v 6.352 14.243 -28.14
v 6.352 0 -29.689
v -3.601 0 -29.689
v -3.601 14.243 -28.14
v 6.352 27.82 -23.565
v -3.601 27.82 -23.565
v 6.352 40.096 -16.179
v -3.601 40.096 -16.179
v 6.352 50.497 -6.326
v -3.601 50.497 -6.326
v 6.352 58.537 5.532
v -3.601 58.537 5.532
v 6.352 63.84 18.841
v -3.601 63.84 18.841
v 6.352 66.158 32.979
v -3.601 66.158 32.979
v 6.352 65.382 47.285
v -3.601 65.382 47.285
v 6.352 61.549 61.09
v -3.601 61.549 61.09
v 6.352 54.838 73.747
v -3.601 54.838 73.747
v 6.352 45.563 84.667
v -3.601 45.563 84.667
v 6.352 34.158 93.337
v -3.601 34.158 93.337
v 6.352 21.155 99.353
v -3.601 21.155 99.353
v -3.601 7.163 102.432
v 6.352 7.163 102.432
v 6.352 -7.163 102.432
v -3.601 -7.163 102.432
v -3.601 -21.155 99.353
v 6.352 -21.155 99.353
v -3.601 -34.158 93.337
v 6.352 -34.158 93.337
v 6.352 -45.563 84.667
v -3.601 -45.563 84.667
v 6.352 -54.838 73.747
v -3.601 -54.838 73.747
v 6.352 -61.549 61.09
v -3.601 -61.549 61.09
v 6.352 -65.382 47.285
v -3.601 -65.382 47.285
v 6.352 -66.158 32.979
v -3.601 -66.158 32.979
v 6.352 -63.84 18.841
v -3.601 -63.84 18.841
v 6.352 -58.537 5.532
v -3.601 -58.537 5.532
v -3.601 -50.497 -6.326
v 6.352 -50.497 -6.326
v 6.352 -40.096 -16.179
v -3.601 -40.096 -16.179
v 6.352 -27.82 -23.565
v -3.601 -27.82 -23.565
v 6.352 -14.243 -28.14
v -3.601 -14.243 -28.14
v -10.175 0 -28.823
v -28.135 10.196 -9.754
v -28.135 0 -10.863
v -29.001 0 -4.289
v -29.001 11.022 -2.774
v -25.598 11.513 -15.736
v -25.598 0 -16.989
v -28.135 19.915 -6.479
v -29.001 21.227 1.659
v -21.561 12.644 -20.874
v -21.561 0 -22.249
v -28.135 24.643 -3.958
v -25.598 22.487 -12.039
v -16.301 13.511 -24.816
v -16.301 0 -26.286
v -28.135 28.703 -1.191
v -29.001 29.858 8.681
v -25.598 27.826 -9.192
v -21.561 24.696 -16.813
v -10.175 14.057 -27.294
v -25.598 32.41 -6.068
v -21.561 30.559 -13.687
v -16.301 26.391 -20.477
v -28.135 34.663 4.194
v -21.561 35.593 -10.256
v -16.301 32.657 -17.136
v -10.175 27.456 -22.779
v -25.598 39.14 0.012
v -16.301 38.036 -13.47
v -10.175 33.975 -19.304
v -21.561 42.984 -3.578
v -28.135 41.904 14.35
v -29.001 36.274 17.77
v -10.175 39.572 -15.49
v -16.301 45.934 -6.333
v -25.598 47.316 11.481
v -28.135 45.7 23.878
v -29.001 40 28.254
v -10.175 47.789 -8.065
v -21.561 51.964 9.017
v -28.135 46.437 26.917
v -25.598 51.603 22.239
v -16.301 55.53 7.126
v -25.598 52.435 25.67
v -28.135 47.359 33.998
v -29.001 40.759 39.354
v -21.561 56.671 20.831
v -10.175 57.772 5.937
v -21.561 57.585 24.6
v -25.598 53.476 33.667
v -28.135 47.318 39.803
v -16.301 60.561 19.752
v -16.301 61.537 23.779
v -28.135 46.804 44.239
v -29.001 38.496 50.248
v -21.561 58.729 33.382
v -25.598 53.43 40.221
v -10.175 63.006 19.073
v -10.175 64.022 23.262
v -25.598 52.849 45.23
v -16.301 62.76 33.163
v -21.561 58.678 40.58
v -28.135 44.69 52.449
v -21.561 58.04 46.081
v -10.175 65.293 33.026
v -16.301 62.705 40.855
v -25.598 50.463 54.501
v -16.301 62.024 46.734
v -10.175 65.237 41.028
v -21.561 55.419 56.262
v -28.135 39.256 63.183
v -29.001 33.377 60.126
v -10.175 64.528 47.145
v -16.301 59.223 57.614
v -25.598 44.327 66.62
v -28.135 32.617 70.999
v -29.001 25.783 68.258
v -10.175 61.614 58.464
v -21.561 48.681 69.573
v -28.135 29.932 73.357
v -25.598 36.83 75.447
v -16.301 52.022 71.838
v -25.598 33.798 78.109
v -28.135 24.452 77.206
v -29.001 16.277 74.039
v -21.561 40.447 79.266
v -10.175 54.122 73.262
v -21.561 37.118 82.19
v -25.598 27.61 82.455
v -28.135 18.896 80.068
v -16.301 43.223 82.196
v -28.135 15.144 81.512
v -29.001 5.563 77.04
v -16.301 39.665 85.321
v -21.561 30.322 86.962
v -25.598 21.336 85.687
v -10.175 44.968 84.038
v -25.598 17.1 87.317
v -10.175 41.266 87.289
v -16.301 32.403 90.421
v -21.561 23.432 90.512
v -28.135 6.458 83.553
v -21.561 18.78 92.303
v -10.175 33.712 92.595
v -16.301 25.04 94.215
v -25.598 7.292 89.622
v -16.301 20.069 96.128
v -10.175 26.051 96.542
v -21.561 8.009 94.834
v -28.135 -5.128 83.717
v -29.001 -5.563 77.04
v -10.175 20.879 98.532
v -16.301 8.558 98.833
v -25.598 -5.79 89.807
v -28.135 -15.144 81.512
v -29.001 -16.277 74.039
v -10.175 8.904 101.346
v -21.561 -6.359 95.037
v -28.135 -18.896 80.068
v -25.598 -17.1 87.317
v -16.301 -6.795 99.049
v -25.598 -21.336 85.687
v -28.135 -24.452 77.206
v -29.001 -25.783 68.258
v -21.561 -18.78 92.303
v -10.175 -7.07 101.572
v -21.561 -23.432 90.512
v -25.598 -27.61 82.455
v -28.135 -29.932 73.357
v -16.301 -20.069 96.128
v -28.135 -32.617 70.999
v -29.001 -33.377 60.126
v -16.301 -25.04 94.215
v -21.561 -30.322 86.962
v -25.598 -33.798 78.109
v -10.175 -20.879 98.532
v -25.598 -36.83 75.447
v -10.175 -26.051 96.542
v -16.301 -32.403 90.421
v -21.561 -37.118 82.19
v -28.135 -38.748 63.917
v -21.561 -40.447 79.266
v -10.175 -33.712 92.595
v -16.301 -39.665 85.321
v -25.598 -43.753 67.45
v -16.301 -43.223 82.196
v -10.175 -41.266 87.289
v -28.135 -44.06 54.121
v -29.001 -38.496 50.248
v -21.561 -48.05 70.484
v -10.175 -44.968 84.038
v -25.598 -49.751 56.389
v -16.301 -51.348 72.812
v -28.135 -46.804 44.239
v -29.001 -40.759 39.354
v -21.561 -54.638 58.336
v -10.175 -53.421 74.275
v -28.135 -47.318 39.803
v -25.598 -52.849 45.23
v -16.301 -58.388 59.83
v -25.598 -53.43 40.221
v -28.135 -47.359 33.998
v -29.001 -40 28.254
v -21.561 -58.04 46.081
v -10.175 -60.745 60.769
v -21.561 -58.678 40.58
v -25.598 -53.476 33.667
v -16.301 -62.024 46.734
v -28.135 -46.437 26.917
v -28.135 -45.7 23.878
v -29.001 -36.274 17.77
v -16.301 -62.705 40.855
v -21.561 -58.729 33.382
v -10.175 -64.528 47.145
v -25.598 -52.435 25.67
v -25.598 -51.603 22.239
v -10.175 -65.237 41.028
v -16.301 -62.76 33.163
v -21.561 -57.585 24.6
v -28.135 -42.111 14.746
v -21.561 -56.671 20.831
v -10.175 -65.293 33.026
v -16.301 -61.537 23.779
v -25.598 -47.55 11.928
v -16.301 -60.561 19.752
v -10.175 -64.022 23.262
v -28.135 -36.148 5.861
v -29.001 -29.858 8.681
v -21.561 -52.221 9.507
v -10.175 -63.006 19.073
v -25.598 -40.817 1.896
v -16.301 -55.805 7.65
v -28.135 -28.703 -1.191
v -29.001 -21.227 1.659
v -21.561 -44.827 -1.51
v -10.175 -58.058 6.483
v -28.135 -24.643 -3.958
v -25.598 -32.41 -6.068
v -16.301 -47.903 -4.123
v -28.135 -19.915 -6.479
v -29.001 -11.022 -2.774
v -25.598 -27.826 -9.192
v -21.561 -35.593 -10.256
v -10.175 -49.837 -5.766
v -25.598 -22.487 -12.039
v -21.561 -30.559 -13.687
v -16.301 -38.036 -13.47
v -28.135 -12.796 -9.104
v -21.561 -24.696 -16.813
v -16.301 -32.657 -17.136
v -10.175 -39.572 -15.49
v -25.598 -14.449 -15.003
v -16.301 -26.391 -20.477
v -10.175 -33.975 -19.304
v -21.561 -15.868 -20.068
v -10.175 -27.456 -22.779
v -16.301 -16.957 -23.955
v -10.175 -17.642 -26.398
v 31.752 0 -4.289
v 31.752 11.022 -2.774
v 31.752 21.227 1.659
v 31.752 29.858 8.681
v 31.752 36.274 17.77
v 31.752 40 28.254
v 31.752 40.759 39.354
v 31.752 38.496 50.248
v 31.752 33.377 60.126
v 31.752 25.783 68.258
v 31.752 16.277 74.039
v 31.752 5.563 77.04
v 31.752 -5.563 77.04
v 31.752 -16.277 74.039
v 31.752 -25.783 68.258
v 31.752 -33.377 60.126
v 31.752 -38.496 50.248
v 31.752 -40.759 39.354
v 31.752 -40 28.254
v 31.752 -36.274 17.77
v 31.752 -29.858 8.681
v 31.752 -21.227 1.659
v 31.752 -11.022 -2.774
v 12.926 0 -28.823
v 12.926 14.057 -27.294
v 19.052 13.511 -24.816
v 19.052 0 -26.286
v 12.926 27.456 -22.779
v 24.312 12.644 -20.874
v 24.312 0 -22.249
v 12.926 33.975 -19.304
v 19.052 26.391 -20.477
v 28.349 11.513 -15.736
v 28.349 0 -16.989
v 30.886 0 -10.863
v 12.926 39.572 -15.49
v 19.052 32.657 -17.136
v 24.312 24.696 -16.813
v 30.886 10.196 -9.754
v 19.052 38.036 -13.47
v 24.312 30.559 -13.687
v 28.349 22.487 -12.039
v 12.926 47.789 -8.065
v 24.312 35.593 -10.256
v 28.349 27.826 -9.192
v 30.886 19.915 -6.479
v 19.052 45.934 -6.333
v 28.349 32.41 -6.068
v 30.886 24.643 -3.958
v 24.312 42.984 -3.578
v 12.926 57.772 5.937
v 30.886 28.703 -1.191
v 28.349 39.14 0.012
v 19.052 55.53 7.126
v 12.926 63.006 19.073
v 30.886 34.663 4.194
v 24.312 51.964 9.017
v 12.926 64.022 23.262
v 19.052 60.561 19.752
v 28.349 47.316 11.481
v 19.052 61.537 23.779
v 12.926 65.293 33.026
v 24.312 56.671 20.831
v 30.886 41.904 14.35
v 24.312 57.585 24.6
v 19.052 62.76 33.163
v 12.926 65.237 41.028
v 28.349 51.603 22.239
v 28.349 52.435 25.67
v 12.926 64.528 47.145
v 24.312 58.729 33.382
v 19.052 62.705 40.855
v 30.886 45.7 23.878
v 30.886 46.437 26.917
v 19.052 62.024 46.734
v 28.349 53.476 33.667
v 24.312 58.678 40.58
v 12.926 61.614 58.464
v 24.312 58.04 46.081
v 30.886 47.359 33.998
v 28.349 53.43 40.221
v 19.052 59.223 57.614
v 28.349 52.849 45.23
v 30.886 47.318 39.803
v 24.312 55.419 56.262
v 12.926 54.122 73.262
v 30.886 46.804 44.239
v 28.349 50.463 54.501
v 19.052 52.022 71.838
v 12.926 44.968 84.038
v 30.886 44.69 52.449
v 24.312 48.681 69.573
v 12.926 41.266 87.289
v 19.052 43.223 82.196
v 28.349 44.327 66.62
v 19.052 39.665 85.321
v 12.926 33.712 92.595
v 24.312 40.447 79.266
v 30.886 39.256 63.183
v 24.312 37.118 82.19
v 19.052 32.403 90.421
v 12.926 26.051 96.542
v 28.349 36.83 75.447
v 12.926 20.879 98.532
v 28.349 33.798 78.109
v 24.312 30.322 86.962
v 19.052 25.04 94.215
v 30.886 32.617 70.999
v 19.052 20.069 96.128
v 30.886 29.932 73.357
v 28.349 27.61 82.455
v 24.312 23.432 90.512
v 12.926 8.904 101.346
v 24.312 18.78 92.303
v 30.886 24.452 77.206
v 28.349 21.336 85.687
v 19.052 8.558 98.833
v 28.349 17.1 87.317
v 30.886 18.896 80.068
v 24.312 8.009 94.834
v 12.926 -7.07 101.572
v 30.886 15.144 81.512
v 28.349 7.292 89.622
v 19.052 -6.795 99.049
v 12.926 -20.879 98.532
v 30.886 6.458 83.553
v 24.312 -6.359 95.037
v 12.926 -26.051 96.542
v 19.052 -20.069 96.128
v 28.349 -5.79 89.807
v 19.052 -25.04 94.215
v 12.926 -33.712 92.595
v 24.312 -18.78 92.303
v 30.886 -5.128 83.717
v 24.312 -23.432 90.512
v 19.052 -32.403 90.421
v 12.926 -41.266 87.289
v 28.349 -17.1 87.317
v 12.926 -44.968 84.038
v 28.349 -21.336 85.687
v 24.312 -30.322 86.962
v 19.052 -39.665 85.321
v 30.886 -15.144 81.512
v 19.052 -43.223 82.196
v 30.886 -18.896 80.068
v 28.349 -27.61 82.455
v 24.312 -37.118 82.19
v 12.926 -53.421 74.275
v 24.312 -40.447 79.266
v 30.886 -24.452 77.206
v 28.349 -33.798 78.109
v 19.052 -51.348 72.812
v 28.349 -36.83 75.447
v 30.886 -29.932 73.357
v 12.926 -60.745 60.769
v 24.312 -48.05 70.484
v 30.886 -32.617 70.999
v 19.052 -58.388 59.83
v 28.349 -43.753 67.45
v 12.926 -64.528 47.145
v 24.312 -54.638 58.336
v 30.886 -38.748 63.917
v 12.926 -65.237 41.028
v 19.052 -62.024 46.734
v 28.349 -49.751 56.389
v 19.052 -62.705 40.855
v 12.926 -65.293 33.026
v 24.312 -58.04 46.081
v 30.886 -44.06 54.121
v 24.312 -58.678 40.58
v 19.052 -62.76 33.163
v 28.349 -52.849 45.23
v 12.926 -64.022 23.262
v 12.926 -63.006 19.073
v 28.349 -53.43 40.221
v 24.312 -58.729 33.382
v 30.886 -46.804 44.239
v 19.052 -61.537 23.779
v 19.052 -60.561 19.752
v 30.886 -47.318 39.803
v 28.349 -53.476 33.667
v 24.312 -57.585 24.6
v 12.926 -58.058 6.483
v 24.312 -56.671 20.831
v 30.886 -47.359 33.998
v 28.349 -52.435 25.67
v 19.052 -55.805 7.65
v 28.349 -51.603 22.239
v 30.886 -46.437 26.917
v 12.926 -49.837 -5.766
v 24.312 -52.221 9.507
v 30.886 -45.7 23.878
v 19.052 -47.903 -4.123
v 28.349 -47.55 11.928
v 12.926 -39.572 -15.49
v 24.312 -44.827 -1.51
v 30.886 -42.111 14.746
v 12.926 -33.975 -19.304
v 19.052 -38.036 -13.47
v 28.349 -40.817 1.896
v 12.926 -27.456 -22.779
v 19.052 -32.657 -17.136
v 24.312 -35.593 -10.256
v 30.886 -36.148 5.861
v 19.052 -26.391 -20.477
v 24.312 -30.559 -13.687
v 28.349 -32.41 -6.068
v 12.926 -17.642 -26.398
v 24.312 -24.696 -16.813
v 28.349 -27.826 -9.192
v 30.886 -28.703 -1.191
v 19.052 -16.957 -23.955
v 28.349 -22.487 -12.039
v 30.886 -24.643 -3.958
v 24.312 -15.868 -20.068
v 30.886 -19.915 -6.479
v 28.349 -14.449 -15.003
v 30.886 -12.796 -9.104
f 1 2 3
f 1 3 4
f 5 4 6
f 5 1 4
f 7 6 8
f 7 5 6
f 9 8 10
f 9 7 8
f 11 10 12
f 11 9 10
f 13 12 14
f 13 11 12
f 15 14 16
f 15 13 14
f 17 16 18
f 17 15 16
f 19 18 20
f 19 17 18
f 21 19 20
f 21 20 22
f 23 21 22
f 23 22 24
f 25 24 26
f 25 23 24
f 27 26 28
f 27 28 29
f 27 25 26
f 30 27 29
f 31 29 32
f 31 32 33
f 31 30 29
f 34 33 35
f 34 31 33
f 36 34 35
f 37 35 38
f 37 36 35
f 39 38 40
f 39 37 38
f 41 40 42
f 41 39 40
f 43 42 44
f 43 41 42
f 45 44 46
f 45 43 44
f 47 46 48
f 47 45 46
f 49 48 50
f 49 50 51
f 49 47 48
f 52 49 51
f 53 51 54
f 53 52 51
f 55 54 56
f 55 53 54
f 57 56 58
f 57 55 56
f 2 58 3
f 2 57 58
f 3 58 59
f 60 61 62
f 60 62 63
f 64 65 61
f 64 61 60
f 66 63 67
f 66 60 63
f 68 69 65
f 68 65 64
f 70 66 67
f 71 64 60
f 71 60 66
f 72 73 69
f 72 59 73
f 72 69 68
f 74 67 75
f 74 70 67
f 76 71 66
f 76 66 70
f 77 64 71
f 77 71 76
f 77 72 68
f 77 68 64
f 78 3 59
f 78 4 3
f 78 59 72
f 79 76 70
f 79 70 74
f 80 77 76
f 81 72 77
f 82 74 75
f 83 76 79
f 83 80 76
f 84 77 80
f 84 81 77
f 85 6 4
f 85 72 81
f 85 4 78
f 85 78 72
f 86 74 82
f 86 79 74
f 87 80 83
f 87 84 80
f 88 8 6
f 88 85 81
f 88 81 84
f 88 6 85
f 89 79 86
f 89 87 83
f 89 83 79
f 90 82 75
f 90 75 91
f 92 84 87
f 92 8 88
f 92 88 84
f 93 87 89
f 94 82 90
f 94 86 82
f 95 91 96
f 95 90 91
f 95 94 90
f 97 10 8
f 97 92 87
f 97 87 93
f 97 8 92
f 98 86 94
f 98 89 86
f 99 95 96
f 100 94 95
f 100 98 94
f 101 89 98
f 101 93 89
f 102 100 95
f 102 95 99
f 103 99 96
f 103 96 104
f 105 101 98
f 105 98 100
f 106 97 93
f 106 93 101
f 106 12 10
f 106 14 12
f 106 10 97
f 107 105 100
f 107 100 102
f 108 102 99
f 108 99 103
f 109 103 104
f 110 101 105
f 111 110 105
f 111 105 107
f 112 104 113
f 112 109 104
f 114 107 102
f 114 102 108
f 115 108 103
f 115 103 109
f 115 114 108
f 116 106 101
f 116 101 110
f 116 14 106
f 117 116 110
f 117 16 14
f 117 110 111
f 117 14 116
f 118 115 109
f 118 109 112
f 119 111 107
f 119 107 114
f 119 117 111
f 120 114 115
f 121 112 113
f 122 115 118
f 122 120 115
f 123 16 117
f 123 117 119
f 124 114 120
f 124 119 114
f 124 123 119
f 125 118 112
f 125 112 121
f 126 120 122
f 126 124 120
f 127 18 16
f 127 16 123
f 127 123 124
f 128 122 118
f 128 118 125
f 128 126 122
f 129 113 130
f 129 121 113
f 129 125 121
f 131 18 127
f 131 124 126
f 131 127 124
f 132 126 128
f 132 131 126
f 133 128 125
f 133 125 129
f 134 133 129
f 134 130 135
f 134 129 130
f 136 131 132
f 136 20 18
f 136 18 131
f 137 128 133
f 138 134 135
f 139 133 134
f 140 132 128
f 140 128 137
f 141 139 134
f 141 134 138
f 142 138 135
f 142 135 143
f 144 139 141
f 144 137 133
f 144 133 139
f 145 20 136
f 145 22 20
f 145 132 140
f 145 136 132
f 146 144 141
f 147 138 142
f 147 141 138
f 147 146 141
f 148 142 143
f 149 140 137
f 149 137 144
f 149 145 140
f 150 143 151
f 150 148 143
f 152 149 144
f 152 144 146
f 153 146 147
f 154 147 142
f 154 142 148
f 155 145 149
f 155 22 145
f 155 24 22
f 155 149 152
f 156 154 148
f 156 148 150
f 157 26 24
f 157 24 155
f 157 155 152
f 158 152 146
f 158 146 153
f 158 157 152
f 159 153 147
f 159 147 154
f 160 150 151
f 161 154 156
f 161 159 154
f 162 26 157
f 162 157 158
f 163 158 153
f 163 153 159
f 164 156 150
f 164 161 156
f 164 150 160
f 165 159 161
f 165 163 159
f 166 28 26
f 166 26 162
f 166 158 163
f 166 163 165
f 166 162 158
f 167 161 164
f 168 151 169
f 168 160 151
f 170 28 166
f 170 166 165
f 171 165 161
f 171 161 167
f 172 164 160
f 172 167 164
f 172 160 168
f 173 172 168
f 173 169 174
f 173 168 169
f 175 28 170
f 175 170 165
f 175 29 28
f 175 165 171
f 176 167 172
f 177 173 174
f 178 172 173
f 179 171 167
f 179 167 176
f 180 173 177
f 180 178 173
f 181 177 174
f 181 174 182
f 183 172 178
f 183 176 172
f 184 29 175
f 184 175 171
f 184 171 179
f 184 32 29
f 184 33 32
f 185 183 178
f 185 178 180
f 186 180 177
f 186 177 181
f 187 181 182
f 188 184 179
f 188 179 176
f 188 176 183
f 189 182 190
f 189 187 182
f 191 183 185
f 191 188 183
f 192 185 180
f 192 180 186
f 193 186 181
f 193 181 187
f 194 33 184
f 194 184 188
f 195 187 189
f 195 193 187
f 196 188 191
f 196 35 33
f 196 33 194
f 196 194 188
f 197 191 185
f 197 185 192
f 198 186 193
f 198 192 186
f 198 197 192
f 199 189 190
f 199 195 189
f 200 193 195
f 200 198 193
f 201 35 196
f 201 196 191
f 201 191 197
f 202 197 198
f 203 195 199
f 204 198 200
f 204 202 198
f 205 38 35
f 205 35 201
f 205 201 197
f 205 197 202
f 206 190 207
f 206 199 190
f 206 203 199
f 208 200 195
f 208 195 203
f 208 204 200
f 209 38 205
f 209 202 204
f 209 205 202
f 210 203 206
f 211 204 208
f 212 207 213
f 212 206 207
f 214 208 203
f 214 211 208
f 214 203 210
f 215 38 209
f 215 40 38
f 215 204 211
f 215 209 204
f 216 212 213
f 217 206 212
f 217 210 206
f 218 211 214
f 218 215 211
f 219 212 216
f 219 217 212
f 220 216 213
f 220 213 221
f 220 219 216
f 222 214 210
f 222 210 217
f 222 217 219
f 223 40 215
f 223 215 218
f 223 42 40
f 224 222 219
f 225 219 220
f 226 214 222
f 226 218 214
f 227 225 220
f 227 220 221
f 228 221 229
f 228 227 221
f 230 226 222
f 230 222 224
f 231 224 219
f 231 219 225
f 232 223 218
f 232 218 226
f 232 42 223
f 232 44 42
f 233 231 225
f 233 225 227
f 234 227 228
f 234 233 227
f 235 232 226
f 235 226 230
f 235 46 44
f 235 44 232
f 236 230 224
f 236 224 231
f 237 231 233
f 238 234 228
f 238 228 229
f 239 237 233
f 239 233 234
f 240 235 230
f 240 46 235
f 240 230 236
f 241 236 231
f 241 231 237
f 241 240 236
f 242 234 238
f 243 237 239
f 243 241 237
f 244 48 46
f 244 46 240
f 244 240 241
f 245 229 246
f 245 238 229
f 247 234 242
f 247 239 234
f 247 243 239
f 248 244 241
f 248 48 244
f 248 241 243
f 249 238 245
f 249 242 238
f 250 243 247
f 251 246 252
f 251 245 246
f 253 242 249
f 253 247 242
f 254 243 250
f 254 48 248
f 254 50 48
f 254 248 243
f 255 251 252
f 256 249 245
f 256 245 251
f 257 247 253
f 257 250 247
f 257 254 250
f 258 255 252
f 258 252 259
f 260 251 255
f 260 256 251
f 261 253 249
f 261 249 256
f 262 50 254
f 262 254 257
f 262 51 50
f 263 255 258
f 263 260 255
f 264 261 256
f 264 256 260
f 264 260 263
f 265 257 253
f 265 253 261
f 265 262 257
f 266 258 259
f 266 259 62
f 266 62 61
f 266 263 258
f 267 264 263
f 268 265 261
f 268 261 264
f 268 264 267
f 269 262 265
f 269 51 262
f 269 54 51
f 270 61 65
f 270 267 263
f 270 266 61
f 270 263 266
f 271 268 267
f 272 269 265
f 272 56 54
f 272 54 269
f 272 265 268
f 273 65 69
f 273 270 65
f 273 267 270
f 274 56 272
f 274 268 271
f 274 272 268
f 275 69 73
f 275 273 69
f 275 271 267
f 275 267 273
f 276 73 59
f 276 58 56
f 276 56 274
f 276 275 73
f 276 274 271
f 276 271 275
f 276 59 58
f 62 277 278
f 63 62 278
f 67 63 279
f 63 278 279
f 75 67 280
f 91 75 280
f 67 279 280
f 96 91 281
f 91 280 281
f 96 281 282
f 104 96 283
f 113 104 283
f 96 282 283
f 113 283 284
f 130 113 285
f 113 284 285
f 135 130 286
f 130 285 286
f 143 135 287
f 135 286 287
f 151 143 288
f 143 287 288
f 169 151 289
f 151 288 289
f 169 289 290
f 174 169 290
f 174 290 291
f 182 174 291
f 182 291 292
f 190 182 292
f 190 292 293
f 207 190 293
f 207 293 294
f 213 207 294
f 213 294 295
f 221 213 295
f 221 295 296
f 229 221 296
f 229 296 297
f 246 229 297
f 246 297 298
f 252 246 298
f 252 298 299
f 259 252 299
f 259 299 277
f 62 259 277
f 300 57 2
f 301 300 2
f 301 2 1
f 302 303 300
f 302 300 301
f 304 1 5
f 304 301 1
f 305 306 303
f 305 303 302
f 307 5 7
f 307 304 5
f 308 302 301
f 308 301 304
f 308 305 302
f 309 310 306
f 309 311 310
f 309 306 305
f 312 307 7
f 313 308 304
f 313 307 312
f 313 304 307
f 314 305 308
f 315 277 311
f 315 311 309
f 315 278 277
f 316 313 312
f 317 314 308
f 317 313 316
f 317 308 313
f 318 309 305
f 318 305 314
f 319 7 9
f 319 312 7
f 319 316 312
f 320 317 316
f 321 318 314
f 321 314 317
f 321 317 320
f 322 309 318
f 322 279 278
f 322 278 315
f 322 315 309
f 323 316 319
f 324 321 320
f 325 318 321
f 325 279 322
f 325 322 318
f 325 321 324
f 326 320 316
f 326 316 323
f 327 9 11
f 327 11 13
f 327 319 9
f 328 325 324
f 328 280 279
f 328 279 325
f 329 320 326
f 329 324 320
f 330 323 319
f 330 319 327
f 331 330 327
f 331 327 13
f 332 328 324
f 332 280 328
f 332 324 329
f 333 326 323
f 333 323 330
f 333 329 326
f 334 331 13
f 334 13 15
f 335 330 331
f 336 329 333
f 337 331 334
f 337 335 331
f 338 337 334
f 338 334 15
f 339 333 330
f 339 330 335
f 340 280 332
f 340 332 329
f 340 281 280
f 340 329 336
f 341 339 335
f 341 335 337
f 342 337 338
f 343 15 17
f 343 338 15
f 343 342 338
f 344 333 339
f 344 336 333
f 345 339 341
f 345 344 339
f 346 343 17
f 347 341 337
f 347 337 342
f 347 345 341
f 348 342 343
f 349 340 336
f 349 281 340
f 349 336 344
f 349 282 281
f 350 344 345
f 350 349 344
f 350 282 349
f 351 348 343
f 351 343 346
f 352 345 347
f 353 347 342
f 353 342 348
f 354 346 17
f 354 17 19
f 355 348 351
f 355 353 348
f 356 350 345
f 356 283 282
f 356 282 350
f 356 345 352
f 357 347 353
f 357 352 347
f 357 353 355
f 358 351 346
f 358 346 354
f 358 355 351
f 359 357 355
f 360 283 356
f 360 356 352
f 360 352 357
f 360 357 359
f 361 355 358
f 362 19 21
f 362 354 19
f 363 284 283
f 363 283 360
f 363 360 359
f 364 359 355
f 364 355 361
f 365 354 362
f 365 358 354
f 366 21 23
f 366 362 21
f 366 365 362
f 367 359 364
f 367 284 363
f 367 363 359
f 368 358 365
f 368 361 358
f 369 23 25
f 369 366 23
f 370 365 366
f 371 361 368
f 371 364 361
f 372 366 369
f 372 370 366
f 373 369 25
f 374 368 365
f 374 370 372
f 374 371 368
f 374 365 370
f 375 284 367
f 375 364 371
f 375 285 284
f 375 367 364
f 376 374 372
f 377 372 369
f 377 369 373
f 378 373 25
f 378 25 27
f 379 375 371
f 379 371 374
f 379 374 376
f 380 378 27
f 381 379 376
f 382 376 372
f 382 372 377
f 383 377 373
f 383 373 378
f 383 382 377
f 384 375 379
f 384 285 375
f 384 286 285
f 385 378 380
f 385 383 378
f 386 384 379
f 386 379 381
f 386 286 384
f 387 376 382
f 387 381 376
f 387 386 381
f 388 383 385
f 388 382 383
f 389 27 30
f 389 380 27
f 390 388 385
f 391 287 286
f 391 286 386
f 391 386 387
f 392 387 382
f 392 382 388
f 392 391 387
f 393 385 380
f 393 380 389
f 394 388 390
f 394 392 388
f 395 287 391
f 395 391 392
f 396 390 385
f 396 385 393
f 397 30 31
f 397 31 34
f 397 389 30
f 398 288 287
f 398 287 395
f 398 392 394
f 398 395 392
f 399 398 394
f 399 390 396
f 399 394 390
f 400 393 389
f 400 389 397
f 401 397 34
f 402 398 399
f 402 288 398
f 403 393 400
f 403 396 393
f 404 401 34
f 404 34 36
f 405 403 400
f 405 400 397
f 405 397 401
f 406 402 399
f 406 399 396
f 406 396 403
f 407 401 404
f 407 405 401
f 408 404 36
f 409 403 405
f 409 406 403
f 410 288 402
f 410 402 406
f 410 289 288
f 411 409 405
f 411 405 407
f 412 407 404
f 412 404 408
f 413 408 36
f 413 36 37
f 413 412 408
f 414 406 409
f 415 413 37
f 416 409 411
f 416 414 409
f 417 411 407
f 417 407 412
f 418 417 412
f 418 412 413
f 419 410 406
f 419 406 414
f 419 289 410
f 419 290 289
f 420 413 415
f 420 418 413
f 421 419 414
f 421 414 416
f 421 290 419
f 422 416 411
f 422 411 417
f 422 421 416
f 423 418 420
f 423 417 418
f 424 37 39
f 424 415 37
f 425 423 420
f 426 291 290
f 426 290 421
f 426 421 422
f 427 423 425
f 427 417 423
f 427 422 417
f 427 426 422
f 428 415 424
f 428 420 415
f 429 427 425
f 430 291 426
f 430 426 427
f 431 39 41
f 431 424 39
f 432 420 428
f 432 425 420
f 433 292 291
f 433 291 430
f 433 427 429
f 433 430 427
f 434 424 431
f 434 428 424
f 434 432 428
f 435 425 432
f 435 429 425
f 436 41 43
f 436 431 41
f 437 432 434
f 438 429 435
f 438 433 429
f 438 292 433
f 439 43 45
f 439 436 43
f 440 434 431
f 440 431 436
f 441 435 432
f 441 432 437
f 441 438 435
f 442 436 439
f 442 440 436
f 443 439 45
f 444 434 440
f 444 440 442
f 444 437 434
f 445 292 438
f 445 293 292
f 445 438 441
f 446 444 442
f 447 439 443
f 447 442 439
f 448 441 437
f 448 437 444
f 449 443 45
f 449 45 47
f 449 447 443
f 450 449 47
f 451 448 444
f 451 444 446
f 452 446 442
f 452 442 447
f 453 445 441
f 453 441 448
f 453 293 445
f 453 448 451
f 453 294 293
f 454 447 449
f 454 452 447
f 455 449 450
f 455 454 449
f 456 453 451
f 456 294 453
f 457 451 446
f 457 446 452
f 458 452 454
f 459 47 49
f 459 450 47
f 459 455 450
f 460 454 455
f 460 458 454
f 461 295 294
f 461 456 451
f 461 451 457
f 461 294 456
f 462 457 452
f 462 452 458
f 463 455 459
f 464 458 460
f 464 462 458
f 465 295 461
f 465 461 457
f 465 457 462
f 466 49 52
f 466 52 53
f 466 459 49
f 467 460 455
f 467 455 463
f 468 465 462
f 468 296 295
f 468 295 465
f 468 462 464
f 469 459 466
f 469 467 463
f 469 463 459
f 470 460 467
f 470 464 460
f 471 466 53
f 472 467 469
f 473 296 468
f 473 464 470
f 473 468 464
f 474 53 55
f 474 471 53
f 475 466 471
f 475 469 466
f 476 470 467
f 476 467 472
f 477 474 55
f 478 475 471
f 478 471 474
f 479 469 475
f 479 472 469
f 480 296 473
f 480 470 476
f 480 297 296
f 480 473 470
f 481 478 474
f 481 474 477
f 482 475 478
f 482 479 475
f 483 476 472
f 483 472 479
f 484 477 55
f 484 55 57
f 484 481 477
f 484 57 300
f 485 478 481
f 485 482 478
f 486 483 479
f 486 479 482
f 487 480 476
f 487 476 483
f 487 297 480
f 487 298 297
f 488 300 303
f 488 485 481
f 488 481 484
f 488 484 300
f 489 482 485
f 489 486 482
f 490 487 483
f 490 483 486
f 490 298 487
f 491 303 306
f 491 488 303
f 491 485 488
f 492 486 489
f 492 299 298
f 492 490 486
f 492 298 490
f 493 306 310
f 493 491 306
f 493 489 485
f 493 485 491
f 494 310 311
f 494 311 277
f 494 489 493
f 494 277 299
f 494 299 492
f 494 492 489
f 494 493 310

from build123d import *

# Parameters (mm, degrees)
F0_W     = 60.7525799423
F0_H     = 66.2546996027
F2_R     = 25.4
F3_DEPTH = 127


with BuildPart() as f1:
    # F0 (on Front) → F1 (revolve)
    with BuildSketch(Plane.XZ):
        with Locations((1.3755289838, 3.4388257191)):
            Rectangle(F0_W, F0_H)
    revolve(axis=Axis((1.3755289838, 0, 36.5661755204), (1, 0, 0)))

    # F2
    f2_edges = [f1.edges().sort_by_distance(p)[0] for p in [
        (31.751819, 0, 102.820875),
        (-29.000761, 0, 102.820875),
    ]]
    fillet(f2_edges, radius=F2_R)

    # F3 (cut): a face of the model
    f3_faces = [f1.faces().sort_by_distance(p)[0] for p in [
        (31.7518189549, 0, 36.5661755204),
    ]]
    extrude(f3_faces, amount=-F3_DEPTH, mode=Mode.SUBTRACT)


solid = f1.part
